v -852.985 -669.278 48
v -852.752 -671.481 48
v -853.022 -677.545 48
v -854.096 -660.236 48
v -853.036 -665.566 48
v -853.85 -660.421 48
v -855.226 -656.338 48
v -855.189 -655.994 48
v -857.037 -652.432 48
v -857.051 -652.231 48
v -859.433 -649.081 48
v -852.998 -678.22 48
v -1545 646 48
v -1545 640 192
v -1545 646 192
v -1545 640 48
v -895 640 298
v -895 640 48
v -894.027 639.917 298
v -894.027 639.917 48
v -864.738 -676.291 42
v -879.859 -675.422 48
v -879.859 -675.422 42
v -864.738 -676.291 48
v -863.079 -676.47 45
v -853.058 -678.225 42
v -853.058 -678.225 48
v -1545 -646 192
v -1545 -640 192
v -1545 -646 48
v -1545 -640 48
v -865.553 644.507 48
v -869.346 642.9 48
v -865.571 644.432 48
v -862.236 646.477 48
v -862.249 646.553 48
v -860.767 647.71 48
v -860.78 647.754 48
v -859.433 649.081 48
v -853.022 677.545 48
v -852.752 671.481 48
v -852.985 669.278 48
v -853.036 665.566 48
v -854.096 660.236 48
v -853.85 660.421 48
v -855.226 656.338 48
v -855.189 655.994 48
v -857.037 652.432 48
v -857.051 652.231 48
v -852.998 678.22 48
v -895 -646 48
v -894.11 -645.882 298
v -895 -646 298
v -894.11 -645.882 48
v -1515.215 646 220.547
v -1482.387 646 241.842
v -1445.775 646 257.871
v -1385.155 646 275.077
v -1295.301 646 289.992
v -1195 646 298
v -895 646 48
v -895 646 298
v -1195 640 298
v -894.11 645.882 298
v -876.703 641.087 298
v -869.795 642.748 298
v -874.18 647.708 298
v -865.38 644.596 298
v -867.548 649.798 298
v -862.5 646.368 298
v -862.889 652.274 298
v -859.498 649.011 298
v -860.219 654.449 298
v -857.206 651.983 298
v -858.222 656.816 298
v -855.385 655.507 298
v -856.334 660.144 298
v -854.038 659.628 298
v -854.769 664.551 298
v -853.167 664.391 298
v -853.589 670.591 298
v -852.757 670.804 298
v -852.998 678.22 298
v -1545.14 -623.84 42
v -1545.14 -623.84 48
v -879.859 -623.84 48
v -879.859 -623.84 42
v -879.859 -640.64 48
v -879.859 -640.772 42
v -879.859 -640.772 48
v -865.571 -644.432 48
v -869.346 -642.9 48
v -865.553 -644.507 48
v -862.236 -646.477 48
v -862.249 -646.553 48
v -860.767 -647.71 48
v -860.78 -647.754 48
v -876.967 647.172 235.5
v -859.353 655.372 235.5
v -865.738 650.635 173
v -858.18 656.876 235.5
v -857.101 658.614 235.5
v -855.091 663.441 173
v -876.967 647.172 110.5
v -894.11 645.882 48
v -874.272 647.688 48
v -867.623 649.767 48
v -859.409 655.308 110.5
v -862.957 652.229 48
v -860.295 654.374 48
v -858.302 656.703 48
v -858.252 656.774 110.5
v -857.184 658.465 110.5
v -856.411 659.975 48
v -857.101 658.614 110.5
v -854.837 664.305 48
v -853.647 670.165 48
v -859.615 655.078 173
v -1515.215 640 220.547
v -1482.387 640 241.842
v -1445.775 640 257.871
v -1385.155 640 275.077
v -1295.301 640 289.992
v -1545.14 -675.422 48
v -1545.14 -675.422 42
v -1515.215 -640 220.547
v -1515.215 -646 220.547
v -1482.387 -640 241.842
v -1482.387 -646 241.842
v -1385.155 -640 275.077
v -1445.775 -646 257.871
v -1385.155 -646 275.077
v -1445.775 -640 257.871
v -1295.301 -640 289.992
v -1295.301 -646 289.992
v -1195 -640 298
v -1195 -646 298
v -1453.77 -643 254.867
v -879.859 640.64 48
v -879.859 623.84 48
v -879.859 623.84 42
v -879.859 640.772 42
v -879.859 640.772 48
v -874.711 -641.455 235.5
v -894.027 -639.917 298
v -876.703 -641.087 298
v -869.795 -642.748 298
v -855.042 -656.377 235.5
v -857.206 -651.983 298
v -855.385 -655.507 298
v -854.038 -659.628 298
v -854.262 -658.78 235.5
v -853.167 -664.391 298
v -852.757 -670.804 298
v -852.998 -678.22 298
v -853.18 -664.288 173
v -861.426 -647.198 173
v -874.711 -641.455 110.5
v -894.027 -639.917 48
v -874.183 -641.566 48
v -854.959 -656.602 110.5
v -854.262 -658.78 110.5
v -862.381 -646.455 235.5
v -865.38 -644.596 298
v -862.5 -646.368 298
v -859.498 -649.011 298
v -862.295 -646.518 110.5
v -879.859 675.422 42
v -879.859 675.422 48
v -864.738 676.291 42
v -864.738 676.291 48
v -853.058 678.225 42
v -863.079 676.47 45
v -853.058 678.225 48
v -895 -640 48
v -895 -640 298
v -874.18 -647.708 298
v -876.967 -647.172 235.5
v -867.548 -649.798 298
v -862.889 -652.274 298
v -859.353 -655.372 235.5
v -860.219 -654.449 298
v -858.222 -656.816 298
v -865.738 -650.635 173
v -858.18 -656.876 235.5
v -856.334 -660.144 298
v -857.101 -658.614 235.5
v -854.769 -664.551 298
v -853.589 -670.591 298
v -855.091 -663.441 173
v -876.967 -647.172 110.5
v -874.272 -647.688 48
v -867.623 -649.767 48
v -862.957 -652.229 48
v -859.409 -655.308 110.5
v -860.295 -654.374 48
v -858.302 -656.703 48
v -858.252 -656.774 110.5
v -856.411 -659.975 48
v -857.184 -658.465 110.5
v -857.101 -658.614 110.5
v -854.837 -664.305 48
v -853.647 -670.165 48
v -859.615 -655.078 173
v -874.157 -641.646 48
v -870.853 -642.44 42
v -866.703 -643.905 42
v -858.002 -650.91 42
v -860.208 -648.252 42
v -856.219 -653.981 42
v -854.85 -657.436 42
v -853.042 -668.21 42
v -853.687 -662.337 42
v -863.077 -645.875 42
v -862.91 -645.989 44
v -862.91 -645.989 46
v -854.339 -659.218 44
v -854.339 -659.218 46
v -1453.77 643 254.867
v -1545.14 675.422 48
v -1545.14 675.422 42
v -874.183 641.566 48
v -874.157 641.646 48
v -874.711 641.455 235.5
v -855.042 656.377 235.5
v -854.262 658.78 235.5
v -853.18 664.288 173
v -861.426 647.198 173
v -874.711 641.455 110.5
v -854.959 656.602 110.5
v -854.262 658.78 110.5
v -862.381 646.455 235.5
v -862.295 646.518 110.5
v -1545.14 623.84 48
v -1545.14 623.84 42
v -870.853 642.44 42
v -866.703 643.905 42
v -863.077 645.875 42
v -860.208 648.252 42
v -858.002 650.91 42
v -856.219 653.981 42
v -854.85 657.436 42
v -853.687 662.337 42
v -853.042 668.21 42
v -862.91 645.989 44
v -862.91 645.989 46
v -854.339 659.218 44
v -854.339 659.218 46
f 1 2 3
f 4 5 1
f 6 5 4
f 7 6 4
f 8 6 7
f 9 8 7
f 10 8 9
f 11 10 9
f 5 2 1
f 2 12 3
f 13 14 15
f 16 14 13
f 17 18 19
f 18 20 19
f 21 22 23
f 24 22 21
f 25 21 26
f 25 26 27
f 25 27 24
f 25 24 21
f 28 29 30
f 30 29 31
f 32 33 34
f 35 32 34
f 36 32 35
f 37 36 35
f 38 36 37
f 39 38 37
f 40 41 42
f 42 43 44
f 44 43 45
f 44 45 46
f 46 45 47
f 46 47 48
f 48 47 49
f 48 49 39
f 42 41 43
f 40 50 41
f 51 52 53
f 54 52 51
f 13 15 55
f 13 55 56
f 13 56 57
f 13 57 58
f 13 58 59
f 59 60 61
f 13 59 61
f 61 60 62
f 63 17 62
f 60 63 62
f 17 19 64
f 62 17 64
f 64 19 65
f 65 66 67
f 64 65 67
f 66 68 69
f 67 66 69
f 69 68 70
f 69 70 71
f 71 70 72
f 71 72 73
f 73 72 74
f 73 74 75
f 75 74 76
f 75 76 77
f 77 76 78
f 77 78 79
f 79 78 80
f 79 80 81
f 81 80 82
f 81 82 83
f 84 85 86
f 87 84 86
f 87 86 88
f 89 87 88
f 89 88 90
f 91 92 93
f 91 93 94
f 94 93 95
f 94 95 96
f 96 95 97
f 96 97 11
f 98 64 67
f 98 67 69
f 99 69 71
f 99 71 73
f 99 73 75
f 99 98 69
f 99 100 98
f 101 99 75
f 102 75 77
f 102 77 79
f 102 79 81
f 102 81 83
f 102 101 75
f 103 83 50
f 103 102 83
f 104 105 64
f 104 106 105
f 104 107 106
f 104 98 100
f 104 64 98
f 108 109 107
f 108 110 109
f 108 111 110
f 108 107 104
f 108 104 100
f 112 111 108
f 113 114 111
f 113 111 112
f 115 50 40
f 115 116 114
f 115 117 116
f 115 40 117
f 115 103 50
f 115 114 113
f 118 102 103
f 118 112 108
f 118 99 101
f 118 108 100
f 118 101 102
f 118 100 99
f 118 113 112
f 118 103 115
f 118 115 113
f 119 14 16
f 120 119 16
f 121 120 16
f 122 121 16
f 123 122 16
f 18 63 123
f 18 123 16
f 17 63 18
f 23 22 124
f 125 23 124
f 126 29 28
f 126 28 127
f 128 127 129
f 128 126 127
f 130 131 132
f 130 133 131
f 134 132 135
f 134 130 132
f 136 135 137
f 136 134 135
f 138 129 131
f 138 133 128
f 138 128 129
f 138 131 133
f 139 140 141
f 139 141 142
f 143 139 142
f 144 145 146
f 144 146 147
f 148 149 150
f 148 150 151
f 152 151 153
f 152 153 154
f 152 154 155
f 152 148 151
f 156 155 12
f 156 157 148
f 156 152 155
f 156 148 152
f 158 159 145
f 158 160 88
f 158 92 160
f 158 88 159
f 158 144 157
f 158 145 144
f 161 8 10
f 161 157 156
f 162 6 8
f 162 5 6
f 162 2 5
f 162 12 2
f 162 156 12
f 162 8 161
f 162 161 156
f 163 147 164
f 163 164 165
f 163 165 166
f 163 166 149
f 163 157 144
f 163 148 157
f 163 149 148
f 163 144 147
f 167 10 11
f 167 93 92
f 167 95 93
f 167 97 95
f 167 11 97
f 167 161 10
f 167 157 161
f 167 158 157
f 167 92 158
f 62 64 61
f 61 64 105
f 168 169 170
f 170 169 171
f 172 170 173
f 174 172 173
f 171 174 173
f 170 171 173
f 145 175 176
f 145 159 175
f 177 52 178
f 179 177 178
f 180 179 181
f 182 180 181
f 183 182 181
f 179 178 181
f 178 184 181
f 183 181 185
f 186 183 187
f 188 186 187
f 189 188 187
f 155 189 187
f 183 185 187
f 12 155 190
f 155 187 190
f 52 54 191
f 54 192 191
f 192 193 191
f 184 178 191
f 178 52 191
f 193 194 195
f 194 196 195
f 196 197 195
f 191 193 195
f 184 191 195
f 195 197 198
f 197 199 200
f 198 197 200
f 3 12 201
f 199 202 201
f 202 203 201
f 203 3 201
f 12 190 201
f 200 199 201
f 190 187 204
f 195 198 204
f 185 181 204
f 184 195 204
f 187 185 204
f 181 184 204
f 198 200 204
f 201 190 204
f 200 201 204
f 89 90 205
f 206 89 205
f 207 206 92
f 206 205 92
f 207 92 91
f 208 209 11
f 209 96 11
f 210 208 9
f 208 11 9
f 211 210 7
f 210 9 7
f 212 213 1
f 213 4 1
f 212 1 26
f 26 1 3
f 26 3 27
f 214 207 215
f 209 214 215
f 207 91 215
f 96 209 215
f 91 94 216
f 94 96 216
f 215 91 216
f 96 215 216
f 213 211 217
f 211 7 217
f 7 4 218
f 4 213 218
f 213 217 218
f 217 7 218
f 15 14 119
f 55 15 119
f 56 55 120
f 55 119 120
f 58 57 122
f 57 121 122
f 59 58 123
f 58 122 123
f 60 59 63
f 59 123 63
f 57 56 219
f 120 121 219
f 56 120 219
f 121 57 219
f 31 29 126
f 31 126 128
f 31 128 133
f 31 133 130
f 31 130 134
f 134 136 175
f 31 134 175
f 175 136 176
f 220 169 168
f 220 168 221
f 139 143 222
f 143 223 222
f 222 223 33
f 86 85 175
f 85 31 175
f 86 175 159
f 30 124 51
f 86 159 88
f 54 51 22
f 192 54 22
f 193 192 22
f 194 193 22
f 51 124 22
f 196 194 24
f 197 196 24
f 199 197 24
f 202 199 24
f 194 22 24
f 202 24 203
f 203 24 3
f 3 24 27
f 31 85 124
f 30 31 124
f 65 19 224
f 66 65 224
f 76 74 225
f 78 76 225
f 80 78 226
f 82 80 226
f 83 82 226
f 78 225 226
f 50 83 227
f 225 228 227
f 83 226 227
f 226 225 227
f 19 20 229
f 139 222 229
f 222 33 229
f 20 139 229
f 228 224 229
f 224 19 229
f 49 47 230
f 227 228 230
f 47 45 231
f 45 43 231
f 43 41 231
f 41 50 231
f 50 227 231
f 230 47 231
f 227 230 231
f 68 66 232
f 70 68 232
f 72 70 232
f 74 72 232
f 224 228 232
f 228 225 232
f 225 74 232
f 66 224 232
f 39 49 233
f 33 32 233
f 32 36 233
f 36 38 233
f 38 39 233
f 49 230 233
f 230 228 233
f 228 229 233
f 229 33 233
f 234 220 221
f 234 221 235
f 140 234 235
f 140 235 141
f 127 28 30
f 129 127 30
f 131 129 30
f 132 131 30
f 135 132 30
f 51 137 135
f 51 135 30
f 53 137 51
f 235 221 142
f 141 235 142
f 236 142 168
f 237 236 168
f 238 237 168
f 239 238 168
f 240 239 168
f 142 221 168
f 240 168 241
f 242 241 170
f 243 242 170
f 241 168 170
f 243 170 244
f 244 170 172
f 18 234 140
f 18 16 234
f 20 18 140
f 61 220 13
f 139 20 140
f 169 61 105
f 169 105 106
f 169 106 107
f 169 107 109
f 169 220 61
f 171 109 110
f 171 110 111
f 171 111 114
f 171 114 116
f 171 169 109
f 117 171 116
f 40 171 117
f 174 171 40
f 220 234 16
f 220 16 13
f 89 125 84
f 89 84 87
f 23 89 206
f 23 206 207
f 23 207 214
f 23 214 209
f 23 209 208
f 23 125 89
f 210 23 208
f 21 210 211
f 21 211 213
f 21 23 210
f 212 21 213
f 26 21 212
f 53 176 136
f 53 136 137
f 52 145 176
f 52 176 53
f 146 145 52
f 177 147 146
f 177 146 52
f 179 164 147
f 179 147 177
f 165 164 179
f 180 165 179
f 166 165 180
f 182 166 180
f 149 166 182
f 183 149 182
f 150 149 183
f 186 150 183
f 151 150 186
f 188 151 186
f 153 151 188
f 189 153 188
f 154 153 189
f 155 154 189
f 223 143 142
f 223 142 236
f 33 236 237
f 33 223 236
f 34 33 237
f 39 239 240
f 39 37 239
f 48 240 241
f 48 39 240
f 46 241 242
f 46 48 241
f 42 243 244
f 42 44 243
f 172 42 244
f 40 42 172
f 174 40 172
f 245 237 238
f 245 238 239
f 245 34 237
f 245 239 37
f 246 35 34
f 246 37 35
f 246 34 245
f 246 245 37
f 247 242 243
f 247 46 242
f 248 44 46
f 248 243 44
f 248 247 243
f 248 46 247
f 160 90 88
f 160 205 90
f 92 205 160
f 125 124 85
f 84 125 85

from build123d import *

# Parameters (mm, degrees)
F2_DEPTH  = 6
F5_DEPTH  = 250
F2_FACE_W = 6
F2_FACE_H = 250
F5_FACE_W = 5.9654505784
F5_FACE_H = 250
F8_DEPTH  = 6


with BuildPart() as f2:
    # F1 (on offset) → F2 (new body)
    with BuildSketch(Plane.XZ.offset(640)):
        with BuildLine():
            Line((-1545, 48), (-895, 48))
            Line((-895, 48), (-895, 298))
            Line((-895, 298), (-1195, 298))
            add(Edge.make_bspline(
                [(-1545, 192), (-1521.7571000476, 218.6039773518), (-1452.732245002, 270.2165911827), (-1295.9794931608, 293.4913064686), (-1195, 298)],
                knots=[0, 0, 0, 0, 0.3938910162, 1, 1, 1, 1], degree=3))
            Line((-1545, 192), (-1545, 48))
        make_face()
    extrude(amount=F2_DEPTH)



with BuildPart() as f5:
    # F4 (on offset) → F5 (new body)
    with BuildSketch(Plane(origin=(0, 0, 48), x_dir=(1, 0, 0), z_dir=(0, 0, -1))):
        with BuildLine():
            Line((-894.1101431847, 645.8818018436), (-894.0272927284, 639.9169266224))
            add(Edge.make_bspline(
                [(-894.0272927284, 639.9169266224), (-879.1374854147, 639.9626126384), (-857.6182809665, 643.1010233585), (-851.8514054669, 662.1984672197), (-852.9979586601, 678.2196462154)],
                knots=[0, 0, 0, 0, 0.5048001428, 1, 1, 1, 1], degree=3))
            add(Edge.make_bspline(
                [(-894.1101431847, 645.8818018436), (-879.759816901, 646.2098372885), (-864.4383073165, 648.6440332993), (-853.5986789601, 659.4021844485), (-852.9979586601, 678.2196462154)],
                knots=[0, 0, 0, 0, 0.4931673704, 1, 1, 1, 1], degree=3))
        make_face()
    extrude(amount=-F5_DEPTH)


with BuildPart() as f2_1:
    add(f2.part)

    add(f5.part)  # F6 merges F5
    # F2_face (on face) → F6 section 0
    with BuildSketch(Plane(origin=(-895, -643, 173), x_dir=(0, 1, 0), z_dir=(1, 0, 0))):
        Rectangle(F2_FACE_W, F2_FACE_H)
    # F5_face (on face) → F6 section 1
    with BuildSketch(Plane(origin=(-894.0687179565, -642.899364233, 173), x_dir=(-0.013888382, -0.9999035518, 0), z_dir=(-0.9999035518, 0.013888382, 0))):
        Rectangle(F5_FACE_W, F5_FACE_H)
    loft()

    # F7 (on offset) → F8 (join)
    with BuildSketch(Plane(origin=(0, 0, 48), x_dir=(1, 0, 0), z_dir=(0, 0, -1))):
        with BuildLine():
            Line((-1545.1399683952, 675.4224896431), (-1545.1399683952, 623.8404810429))
            Line((-1545.1399683952, 623.8404810429), (-879.85932827, 623.8404810429))
            Line((-879.85932827, 623.8404810429), (-879.85932827, 640.7720148563))
            add(Edge.make_bspline(
                [(-879.85932827, 640.7720148563), (-873.7173506265, 641.4606158564), (-861.5878448777, 644.1360934873), (-852.7061162653, 658.5082899728), (-852.7703283891, 673.17682316), (-853.0581593513, 678.2253980637)],
                knots=[0, 0, 0, 0, 0.3356585098, 0.6521125175, 1, 1, 1, 1], degree=3))
            add(Edge.make_bspline(
                [(-879.85932827, 675.4224896431), (-873.9006117868, 675.6584678832), (-863.306645405, 676.0780121844), (-856.1774461923, 677.571807623), (-853.0581593513, 678.2253980637)],
                knots=[0, 0, 0, 0, 0.5624632237, 1, 1, 1, 1], degree=3))
            Line((-879.85932827, 675.4224896431), (-1545.1399683952, 675.4224896431))
        make_face()
    extrude(amount=F8_DEPTH)


with BuildPart() as f9_1:
    # F9: instance of F2
    add(f2_1.part.mirror(Plane.XZ))


solid = Compound([f2_1.part, f9_1.part])
